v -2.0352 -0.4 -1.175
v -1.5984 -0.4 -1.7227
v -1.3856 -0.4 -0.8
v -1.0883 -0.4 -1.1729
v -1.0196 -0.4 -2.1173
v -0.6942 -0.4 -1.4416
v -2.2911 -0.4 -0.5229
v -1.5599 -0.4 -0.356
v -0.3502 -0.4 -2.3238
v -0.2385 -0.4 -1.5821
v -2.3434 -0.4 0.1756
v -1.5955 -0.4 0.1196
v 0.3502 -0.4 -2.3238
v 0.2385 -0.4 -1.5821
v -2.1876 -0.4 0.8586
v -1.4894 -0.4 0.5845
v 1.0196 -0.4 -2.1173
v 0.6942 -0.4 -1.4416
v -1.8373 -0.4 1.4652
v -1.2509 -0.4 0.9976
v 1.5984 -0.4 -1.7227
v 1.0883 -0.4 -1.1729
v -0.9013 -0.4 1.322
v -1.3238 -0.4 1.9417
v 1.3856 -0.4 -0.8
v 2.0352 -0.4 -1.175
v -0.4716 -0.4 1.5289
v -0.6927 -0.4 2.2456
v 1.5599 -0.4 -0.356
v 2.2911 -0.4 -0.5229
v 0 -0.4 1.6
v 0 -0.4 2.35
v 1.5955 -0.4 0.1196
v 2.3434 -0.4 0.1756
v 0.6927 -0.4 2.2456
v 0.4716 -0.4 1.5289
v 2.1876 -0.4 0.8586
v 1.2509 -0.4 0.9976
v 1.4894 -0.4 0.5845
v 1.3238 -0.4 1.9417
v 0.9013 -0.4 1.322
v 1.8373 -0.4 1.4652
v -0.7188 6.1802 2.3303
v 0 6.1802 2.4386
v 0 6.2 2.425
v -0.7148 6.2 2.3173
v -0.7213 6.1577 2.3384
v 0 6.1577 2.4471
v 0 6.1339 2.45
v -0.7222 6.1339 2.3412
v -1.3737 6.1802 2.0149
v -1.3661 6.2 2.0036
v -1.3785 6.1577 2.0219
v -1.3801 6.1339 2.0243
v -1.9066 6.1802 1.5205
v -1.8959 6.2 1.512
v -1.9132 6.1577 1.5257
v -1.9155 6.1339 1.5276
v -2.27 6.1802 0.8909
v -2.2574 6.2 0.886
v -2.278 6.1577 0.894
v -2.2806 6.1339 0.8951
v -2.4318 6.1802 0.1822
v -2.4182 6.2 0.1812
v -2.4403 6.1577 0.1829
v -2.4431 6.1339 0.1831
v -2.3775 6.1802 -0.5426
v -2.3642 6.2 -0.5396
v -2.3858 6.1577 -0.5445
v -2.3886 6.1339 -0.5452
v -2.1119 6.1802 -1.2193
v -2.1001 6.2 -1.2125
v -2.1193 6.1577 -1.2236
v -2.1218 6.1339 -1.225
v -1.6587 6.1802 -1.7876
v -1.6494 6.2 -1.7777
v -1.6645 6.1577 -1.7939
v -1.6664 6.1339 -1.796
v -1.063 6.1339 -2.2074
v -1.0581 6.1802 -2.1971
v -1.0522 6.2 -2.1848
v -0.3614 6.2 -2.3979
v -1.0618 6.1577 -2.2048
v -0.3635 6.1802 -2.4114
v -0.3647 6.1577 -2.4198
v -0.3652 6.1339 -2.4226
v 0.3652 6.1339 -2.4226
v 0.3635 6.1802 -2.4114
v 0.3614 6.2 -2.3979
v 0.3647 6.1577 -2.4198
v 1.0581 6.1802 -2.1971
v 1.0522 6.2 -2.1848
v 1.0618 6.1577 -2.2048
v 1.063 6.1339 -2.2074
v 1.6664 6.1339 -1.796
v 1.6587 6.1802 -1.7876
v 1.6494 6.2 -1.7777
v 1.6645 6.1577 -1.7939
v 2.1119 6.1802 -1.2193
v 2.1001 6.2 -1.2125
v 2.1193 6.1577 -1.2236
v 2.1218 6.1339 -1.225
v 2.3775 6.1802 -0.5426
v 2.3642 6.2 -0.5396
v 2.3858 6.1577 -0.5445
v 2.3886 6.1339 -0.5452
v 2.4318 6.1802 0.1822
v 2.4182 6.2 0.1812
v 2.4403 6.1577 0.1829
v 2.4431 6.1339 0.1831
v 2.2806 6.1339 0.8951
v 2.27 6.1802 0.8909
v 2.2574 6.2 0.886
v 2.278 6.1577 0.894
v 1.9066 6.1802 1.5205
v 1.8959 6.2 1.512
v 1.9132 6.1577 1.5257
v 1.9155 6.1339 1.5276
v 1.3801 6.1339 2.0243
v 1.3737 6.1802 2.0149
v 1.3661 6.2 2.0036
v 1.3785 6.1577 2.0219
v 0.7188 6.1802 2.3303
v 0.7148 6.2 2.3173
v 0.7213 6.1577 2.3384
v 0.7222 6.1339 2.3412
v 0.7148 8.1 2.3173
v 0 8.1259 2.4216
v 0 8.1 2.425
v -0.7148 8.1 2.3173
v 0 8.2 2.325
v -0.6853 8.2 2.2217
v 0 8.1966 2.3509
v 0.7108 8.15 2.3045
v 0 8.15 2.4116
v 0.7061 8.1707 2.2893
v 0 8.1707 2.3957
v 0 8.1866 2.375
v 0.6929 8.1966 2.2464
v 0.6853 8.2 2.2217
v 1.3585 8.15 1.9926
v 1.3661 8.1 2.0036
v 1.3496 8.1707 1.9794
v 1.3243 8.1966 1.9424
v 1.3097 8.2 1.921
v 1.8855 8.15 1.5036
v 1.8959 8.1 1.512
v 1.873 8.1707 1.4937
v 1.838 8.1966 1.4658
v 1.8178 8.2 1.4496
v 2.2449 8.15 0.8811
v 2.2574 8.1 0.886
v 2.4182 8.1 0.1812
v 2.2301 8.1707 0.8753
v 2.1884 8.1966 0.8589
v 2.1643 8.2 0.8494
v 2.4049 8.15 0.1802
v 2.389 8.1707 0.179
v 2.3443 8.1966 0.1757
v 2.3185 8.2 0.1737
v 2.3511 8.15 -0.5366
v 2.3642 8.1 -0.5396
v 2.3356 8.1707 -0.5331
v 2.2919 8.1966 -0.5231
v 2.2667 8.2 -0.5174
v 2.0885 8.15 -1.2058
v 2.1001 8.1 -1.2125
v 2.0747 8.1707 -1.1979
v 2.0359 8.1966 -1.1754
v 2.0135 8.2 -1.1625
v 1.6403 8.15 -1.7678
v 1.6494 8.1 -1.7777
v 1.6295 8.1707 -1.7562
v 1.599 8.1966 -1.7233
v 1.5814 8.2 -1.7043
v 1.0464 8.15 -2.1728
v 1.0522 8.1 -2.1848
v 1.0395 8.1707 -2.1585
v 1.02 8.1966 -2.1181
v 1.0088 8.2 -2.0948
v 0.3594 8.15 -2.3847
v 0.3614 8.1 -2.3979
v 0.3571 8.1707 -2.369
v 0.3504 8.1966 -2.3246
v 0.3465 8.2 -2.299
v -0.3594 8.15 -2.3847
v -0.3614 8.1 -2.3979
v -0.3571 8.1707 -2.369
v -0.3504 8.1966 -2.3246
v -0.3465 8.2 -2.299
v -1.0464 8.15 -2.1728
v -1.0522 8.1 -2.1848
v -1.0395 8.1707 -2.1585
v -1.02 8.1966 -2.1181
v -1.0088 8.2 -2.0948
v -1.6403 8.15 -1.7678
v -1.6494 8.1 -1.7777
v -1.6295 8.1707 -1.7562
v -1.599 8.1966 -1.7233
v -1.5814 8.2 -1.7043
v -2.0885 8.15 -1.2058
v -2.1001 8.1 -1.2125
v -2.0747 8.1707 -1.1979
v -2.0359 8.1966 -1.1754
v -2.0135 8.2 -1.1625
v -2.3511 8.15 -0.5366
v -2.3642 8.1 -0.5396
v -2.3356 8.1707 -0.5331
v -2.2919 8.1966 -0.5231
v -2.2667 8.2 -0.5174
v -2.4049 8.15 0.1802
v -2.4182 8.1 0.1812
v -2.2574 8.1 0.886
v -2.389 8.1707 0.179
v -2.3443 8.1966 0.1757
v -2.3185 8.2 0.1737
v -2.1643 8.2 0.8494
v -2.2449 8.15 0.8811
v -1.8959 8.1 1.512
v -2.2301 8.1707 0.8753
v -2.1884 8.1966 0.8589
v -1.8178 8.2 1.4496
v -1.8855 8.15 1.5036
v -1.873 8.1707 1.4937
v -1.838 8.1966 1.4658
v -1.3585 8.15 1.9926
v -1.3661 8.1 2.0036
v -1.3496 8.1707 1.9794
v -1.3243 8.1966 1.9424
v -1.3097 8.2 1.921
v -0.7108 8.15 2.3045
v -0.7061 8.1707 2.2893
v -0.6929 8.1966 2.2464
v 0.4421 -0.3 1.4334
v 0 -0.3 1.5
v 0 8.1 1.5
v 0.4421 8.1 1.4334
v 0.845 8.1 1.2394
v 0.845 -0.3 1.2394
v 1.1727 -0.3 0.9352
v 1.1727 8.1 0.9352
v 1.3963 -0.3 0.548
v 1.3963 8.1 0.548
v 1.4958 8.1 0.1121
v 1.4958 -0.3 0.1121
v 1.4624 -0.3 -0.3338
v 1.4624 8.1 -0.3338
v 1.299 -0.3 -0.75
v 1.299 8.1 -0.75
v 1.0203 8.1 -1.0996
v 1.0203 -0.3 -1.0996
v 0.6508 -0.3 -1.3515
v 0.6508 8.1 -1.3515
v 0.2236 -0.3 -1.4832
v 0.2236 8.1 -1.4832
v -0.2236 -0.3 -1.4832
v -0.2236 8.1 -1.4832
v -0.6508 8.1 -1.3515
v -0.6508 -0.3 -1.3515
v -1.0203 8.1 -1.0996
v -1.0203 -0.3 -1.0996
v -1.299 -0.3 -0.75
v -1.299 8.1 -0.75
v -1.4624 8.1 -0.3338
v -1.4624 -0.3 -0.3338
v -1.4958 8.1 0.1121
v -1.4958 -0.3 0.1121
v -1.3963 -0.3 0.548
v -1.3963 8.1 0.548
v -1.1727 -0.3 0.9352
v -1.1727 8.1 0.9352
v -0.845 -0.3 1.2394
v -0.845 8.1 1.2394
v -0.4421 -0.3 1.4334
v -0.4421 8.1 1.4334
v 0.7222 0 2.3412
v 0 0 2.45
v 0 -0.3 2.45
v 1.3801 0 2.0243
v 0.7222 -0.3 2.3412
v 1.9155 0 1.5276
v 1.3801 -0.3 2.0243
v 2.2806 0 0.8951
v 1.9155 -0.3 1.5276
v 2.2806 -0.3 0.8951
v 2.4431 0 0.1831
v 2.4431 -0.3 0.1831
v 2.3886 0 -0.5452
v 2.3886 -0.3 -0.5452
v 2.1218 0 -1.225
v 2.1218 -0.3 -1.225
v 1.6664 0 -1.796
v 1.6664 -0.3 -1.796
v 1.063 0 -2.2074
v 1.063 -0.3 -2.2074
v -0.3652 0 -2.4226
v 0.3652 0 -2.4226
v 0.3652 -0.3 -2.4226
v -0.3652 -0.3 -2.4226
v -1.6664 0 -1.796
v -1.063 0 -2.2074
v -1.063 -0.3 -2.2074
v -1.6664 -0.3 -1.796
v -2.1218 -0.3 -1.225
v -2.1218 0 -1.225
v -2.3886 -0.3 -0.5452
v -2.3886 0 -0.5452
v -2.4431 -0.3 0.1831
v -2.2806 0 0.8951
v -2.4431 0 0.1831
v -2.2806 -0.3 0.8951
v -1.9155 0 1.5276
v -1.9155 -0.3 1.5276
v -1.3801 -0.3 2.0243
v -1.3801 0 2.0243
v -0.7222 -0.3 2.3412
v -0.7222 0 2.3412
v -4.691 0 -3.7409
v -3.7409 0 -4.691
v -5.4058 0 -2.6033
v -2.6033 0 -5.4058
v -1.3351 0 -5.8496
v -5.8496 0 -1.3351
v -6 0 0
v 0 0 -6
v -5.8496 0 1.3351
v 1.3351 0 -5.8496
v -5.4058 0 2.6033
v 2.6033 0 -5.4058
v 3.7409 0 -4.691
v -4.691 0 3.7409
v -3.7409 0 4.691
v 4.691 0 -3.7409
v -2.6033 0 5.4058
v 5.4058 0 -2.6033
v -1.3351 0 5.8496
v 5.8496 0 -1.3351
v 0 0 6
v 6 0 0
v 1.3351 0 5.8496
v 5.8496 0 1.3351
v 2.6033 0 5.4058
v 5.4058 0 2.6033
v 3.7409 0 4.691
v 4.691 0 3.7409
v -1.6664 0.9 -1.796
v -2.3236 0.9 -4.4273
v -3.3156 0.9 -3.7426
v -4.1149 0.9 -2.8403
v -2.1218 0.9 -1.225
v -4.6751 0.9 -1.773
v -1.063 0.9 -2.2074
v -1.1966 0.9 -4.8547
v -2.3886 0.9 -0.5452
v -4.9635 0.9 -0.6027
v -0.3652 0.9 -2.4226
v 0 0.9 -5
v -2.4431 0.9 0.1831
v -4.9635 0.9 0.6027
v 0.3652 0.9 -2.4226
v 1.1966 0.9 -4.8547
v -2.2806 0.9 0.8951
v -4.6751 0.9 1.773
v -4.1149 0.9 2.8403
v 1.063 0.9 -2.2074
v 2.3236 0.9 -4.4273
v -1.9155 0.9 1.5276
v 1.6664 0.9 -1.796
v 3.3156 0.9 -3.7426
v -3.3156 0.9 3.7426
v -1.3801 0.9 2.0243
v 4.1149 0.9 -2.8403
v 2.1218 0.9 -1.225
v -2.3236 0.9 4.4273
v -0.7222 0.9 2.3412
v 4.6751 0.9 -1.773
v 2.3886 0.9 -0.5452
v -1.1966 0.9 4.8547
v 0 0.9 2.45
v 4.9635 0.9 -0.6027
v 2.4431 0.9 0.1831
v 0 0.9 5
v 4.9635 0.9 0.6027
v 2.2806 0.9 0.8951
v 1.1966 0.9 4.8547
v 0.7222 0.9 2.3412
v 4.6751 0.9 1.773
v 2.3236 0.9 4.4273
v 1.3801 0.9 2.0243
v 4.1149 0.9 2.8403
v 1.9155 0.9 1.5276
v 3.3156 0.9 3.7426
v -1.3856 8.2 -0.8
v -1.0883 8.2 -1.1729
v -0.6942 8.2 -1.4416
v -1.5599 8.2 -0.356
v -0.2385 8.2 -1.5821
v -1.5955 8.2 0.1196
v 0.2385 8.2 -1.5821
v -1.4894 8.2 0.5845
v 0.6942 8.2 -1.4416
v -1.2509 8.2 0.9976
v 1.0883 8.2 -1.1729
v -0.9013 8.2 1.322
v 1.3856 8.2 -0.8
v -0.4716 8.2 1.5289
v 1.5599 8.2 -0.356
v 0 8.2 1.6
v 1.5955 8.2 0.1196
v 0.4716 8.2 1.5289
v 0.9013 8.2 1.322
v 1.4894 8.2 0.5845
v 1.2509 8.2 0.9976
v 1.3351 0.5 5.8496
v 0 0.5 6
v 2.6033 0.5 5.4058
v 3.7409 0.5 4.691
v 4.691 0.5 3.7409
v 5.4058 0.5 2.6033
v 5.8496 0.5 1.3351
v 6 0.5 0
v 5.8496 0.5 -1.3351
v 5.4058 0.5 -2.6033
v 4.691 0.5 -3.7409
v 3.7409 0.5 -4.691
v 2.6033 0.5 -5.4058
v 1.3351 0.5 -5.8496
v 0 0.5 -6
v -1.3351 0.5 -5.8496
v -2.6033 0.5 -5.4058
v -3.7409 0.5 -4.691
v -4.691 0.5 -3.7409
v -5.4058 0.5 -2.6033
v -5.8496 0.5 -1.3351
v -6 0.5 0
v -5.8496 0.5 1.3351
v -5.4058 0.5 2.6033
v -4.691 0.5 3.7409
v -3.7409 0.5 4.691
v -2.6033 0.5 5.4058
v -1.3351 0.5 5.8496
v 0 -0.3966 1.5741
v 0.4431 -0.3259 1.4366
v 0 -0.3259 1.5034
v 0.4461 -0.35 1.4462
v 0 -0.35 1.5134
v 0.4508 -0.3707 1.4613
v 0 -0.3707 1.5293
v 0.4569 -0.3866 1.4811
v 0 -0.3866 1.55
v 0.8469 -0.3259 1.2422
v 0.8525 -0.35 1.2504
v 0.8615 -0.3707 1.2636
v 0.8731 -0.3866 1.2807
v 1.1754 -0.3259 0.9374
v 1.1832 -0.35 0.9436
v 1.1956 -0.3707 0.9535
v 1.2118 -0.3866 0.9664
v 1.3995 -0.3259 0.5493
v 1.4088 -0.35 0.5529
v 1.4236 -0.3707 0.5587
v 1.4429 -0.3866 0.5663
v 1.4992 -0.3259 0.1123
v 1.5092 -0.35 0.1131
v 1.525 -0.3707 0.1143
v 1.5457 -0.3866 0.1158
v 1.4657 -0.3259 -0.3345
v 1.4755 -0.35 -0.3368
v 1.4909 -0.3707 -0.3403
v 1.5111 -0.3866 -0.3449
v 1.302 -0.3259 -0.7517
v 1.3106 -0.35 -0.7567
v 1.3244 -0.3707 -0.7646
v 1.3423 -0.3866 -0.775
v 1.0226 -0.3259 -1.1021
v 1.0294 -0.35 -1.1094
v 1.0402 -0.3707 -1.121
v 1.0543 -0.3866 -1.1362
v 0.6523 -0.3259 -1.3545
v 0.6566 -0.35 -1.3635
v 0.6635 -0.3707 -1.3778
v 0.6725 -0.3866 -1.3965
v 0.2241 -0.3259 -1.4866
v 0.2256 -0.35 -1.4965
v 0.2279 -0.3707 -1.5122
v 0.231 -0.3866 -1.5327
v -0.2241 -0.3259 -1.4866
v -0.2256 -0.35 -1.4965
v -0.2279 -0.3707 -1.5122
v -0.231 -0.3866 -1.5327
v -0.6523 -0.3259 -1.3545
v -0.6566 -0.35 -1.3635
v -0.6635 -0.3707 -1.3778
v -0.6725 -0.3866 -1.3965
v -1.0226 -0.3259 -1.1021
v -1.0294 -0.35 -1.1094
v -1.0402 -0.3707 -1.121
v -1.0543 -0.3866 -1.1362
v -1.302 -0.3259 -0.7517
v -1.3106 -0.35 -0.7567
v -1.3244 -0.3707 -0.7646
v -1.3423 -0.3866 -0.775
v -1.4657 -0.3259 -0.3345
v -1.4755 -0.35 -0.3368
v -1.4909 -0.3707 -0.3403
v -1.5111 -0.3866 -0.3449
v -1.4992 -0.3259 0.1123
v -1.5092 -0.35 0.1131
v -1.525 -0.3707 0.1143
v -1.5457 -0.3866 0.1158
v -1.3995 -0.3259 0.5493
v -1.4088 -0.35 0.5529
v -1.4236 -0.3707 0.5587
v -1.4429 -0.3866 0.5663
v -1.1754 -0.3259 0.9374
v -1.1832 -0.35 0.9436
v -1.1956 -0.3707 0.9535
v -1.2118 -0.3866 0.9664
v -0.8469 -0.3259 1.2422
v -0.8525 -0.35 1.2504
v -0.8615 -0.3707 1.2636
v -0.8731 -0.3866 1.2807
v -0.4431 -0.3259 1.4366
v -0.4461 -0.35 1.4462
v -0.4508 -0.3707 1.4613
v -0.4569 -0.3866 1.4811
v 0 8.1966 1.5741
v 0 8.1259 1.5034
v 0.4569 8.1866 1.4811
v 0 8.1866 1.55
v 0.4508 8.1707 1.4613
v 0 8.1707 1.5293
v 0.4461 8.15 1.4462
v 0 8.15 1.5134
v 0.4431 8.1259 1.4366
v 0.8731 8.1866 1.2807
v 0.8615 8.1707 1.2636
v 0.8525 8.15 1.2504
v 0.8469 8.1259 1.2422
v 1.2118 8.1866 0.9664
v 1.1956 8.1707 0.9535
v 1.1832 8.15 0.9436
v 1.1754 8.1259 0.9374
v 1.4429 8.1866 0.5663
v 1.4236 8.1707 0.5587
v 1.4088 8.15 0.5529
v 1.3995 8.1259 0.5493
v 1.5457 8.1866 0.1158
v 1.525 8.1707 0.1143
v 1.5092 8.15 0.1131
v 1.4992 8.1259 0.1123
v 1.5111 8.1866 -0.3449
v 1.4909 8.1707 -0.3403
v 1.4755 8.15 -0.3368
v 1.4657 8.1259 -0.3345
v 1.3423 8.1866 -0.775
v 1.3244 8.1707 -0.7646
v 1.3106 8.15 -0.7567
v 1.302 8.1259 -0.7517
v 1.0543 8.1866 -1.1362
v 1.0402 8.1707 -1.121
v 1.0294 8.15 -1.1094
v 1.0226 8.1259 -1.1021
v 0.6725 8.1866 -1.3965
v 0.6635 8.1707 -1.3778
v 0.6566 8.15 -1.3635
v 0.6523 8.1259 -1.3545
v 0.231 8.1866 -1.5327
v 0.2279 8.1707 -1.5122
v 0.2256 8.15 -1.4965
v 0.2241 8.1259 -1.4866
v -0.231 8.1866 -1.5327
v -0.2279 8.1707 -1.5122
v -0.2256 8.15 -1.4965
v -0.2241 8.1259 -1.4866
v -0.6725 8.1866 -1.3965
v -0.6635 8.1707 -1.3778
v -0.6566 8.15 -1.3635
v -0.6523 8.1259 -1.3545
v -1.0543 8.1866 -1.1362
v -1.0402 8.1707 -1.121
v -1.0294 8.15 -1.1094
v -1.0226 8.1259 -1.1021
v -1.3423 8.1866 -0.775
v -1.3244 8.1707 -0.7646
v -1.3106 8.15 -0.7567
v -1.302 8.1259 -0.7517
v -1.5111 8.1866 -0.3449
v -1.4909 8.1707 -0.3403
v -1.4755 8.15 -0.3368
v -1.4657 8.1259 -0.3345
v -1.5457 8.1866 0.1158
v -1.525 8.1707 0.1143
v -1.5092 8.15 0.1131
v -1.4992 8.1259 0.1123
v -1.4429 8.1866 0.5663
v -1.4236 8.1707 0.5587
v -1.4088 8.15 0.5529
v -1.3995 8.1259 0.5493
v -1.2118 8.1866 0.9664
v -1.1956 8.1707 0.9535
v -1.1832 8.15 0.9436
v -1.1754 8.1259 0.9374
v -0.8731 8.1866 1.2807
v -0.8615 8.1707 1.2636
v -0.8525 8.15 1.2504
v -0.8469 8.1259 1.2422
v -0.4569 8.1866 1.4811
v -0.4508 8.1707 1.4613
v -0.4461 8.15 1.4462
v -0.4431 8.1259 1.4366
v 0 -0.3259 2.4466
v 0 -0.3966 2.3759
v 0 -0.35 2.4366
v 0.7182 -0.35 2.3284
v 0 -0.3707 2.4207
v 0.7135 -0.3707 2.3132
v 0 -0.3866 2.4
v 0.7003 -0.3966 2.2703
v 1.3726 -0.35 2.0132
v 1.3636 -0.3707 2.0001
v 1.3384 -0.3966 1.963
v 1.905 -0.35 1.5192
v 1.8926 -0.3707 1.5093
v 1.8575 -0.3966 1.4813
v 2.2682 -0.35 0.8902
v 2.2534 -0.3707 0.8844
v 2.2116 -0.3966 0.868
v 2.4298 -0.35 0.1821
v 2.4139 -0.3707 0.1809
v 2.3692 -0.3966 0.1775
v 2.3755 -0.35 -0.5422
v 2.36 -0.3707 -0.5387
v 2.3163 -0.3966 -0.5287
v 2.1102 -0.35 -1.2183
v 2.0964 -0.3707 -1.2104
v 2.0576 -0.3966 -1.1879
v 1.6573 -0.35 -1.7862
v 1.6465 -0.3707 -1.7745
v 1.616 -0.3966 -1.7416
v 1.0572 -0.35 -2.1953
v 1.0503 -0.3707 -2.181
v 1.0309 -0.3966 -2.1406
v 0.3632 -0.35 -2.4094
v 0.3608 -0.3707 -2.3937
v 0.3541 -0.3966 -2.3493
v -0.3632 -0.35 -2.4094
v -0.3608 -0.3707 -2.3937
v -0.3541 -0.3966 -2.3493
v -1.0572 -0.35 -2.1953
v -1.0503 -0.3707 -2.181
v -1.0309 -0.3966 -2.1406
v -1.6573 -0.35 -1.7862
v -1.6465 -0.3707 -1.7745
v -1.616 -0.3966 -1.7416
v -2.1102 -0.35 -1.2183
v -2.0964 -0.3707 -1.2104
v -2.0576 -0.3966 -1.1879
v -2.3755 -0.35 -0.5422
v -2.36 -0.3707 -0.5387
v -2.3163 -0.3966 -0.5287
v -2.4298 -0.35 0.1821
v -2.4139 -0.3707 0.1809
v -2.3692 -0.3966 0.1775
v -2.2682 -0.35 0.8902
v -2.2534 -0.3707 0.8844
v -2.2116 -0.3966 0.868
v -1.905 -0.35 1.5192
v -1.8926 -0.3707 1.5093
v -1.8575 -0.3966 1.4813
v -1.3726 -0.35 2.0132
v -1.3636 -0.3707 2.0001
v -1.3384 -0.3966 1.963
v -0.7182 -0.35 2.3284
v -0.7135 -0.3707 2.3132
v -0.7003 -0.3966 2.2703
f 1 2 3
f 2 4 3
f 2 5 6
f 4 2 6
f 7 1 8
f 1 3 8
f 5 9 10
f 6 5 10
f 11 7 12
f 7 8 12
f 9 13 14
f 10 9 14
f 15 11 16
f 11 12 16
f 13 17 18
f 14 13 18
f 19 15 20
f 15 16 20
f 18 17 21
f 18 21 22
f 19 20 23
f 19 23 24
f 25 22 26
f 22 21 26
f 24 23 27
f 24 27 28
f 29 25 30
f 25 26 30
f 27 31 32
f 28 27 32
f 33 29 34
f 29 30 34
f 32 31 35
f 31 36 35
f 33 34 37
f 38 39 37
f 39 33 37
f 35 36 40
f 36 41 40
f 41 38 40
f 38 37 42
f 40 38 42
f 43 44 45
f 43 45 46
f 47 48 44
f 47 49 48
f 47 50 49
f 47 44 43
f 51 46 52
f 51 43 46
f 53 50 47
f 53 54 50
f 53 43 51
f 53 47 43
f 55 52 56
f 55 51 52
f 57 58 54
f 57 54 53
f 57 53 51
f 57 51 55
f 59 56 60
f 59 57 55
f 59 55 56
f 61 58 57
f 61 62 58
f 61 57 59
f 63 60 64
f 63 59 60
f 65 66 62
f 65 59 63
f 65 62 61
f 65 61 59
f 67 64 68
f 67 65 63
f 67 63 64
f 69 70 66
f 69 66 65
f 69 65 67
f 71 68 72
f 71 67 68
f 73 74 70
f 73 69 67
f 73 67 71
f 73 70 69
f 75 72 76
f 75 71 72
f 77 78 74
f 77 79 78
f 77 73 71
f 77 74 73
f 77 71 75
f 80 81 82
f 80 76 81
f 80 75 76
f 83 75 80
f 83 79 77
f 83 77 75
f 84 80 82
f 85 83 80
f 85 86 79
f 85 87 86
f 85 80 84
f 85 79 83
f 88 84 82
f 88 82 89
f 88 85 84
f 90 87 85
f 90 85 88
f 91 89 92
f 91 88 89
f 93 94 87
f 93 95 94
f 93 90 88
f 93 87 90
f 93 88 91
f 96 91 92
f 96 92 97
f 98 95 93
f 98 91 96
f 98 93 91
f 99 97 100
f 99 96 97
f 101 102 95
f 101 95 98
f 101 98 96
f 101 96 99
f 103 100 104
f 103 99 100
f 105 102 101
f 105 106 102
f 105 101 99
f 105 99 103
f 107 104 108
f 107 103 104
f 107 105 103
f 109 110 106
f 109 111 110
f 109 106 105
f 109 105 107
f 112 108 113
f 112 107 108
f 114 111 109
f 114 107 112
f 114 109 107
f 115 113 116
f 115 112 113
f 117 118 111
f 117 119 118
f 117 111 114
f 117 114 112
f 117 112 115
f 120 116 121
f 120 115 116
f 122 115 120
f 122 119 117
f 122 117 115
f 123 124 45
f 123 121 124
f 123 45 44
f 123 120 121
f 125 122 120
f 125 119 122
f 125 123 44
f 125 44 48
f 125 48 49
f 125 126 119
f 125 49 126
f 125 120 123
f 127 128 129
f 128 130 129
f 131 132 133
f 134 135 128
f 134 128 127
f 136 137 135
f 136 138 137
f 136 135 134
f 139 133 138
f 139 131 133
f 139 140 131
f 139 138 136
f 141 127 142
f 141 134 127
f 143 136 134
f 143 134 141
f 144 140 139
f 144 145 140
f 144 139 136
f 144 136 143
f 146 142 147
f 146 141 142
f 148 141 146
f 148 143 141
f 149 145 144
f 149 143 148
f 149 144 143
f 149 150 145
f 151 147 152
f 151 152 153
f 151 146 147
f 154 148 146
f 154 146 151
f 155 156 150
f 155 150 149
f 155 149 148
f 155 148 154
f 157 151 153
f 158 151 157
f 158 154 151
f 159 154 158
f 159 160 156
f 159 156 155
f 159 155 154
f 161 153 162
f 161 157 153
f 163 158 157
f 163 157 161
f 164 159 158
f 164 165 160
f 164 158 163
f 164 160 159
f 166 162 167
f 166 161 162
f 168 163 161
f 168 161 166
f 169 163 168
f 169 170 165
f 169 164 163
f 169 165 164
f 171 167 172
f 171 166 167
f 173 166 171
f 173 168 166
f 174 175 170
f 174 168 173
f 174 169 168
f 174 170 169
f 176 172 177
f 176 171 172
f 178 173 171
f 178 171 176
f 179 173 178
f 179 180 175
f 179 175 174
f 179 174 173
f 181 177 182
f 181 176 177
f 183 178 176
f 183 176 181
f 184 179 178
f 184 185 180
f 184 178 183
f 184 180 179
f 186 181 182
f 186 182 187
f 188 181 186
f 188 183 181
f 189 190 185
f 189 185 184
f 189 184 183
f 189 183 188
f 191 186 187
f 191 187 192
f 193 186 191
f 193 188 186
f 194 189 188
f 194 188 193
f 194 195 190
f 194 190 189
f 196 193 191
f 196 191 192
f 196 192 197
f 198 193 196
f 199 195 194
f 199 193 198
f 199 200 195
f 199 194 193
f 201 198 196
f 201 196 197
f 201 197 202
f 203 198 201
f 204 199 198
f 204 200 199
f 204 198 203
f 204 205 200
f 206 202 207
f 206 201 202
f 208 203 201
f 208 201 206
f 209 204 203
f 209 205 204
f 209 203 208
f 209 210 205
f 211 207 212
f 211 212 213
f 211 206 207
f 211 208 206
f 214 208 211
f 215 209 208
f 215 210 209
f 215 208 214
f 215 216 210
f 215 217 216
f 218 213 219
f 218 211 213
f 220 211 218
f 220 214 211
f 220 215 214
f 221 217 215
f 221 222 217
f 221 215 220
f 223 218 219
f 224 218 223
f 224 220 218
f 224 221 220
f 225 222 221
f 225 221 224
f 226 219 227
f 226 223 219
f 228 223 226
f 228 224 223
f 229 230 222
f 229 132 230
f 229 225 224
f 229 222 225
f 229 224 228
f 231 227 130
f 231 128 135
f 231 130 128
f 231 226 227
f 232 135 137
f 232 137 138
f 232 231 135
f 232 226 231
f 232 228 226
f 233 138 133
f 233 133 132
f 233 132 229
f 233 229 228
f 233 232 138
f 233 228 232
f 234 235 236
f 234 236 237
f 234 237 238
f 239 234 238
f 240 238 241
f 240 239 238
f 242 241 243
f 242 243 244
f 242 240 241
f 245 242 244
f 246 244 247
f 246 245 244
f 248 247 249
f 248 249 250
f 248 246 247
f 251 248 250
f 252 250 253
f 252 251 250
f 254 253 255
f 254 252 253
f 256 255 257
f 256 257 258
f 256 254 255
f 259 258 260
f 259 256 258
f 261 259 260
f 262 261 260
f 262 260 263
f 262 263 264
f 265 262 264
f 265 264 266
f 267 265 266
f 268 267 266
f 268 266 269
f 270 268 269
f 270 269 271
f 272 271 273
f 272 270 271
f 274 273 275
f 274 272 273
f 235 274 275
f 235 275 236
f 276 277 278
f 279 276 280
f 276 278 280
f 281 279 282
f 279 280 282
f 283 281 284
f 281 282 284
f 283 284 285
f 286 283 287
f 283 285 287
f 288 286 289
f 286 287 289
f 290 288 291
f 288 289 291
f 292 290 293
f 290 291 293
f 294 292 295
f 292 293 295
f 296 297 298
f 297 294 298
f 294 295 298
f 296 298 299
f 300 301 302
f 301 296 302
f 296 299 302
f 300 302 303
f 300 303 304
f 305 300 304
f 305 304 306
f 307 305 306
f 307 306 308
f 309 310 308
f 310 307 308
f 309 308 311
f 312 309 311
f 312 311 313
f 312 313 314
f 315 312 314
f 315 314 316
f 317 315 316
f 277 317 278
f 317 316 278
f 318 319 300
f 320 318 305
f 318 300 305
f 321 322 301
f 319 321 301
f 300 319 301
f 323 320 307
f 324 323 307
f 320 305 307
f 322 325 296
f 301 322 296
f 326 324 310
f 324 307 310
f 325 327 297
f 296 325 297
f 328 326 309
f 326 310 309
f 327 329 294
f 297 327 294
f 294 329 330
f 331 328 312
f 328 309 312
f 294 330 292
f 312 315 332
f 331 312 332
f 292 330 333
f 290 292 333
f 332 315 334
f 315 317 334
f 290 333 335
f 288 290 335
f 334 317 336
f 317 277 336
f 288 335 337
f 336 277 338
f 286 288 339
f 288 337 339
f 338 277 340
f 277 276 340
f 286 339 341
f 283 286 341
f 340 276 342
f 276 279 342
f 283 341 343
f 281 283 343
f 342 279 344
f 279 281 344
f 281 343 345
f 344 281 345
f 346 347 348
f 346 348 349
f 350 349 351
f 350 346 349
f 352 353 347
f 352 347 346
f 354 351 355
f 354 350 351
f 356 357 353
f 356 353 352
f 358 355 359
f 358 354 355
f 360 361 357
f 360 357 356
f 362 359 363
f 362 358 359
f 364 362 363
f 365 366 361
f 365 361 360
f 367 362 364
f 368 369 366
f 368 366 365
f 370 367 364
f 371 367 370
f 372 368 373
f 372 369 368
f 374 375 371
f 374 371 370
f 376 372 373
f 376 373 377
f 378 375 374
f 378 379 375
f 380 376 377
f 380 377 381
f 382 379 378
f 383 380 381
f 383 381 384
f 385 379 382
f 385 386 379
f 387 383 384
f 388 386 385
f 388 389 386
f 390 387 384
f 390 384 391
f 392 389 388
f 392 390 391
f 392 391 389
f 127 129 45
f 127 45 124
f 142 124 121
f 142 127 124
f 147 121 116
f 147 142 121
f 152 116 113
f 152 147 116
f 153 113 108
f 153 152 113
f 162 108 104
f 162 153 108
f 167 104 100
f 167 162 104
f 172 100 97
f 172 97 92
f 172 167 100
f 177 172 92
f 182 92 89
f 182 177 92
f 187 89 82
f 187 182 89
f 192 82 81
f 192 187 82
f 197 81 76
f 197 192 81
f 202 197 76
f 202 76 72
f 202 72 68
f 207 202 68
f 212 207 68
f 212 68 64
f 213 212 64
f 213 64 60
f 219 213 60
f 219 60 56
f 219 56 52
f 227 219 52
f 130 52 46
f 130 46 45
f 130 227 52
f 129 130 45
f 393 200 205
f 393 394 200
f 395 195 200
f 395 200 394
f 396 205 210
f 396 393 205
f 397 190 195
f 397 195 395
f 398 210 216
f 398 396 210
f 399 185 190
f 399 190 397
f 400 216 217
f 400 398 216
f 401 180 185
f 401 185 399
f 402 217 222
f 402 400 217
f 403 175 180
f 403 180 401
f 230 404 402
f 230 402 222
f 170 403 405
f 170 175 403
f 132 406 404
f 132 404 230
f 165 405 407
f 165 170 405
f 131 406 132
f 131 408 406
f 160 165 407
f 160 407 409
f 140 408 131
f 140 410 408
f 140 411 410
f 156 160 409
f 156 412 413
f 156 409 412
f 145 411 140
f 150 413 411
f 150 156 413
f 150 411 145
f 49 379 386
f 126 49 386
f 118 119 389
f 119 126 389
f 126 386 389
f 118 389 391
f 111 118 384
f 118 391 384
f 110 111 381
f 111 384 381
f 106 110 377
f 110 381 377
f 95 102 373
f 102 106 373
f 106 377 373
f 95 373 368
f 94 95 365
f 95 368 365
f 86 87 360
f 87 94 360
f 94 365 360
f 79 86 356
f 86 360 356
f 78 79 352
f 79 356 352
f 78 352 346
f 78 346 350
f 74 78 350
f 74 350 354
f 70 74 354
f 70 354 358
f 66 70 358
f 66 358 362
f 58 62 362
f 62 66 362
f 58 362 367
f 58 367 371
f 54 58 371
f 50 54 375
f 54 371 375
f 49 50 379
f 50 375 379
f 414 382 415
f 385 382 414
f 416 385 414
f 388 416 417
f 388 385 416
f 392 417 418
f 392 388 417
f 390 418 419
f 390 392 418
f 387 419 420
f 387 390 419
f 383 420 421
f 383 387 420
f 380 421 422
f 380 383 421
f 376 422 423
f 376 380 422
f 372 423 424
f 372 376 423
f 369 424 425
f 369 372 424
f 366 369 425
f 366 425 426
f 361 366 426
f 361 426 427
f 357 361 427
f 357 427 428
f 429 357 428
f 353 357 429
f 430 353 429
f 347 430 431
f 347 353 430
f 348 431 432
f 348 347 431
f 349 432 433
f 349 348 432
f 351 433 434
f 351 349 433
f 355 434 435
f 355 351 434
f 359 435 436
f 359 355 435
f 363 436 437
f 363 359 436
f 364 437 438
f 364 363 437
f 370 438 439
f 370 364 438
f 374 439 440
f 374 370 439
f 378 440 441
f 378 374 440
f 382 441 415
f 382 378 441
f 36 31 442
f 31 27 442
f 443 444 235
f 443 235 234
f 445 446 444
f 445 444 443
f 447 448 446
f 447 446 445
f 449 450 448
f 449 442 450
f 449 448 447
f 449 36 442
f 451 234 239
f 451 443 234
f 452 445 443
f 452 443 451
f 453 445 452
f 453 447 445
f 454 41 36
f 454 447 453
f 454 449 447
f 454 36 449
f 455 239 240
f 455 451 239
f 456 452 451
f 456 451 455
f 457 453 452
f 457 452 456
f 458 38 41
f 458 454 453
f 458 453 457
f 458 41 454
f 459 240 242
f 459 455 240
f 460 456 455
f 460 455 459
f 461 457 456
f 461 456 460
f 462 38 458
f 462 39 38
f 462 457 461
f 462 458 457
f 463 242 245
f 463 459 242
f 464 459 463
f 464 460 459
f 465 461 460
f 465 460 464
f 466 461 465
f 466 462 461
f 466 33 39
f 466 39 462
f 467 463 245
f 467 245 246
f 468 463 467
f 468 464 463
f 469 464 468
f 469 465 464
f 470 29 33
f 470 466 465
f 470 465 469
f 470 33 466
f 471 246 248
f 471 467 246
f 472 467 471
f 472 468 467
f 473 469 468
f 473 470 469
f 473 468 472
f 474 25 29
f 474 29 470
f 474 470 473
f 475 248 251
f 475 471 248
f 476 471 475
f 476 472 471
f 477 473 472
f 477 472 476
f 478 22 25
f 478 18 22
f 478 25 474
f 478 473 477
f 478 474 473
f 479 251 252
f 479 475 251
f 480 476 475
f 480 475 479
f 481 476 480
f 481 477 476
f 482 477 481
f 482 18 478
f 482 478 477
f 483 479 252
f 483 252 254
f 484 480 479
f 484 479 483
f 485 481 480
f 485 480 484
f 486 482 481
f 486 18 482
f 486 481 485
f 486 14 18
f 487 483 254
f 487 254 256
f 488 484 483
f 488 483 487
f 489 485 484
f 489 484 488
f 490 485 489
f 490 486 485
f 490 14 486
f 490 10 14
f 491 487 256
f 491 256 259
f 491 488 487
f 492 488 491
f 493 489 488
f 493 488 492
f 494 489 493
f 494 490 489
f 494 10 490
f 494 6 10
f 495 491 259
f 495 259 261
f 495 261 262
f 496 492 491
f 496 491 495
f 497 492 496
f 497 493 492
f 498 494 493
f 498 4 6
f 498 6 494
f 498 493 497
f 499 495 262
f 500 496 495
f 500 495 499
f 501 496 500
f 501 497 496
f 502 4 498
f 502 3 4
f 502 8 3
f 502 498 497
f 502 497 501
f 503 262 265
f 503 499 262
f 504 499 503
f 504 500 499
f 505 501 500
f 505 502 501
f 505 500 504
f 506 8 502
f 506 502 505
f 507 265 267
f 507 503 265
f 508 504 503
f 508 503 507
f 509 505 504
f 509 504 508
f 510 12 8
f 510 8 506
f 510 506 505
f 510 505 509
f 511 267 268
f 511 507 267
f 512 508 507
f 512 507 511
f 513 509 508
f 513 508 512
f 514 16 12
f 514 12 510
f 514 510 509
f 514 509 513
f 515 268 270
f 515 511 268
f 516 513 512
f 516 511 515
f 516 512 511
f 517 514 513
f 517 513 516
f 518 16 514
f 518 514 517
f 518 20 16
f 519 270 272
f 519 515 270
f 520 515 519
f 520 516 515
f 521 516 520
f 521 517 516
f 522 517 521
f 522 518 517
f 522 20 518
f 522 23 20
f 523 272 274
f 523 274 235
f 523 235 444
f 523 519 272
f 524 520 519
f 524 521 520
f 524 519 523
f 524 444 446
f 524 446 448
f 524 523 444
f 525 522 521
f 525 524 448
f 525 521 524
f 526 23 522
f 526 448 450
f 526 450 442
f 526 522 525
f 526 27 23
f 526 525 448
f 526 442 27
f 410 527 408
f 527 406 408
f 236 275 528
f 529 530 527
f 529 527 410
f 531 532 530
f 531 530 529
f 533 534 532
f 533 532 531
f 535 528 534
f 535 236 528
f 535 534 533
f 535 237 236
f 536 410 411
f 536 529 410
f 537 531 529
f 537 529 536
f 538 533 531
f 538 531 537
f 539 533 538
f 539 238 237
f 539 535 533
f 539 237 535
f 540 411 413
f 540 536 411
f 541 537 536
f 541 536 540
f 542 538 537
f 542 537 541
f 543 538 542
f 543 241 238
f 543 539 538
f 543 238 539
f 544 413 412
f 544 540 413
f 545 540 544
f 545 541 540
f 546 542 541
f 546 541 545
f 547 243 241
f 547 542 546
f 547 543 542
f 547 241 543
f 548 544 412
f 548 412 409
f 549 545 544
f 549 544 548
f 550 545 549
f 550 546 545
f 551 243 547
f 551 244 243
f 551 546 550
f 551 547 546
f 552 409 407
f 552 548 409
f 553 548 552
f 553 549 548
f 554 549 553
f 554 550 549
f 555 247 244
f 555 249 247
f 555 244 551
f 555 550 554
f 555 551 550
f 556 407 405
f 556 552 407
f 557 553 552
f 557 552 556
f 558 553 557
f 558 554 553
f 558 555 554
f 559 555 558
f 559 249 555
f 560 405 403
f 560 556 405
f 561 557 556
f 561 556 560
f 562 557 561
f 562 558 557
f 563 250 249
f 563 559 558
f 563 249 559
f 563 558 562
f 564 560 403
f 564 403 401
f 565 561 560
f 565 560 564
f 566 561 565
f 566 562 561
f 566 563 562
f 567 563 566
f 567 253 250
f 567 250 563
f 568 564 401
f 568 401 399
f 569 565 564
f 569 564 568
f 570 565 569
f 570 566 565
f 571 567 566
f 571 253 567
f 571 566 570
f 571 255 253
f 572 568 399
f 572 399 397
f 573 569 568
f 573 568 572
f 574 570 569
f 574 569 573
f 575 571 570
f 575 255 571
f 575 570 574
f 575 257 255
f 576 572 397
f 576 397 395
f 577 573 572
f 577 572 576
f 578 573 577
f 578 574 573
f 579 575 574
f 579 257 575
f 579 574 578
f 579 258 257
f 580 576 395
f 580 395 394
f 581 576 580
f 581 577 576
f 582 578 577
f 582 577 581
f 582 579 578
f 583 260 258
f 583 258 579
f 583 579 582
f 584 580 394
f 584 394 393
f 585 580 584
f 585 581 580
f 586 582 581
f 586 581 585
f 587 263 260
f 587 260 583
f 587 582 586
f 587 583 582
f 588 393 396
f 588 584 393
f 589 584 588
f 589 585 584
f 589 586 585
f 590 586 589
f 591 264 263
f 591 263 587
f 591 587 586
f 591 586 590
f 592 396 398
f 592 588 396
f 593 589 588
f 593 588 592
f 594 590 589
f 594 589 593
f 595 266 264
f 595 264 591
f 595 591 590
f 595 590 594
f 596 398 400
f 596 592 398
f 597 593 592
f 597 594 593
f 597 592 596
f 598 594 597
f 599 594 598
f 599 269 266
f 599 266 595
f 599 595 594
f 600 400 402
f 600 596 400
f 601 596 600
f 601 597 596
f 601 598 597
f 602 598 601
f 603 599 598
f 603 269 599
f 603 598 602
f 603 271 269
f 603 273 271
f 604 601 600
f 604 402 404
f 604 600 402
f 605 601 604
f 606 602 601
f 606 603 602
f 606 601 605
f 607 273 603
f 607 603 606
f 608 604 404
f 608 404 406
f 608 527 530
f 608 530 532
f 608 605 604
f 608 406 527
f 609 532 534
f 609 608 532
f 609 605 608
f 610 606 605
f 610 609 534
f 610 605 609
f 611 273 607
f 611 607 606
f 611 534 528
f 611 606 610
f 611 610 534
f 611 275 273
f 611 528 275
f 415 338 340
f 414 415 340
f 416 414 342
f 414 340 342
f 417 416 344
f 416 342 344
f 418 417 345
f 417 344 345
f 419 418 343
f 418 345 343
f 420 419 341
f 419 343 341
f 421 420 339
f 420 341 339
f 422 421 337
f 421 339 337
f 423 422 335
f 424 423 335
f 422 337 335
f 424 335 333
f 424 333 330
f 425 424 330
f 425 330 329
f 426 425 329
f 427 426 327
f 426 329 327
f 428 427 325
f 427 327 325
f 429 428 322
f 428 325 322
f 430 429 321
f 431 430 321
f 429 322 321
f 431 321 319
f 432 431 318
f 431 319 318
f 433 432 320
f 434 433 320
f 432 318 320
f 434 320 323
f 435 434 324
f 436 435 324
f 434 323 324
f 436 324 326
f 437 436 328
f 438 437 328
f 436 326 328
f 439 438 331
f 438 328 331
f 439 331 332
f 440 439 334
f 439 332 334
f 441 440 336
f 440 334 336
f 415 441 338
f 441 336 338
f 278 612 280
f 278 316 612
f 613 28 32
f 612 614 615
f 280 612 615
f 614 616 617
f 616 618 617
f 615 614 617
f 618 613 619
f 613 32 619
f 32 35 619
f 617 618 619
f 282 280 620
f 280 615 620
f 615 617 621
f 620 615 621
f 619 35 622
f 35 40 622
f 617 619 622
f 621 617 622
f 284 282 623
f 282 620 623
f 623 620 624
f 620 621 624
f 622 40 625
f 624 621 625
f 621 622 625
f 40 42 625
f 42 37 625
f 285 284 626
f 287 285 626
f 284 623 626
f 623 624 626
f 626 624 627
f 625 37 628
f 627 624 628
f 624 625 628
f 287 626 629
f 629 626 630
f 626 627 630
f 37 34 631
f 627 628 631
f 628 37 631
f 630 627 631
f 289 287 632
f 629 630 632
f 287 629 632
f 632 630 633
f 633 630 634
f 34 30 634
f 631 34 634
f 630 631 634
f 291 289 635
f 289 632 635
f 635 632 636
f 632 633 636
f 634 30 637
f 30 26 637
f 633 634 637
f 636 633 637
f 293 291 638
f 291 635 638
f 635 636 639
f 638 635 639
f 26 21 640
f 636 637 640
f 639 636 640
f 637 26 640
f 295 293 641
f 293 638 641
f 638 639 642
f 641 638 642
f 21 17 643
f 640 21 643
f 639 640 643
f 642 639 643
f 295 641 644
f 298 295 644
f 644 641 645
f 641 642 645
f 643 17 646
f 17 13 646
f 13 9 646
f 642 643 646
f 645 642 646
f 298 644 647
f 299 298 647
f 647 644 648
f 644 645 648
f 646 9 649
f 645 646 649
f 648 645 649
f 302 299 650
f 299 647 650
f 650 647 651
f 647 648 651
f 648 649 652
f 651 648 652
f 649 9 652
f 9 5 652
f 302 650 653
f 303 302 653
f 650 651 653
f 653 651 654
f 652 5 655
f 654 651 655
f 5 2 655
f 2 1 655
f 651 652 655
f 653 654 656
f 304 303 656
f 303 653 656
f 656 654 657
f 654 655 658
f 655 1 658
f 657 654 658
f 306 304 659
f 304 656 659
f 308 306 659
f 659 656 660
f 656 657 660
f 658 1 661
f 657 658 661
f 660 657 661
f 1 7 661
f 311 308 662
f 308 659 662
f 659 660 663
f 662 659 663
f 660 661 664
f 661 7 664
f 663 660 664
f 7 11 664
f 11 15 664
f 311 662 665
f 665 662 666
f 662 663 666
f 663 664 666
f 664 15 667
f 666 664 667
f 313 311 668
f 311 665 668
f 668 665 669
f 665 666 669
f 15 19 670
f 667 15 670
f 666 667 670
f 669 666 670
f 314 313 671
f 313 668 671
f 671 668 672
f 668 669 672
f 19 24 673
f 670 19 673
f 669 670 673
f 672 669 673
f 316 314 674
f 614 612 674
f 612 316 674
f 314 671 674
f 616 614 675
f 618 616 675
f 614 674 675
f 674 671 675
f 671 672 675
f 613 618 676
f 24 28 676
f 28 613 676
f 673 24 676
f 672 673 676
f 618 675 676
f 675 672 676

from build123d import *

# Parameters (mm, degrees)
SKETCH_1_R           = 6
SKETCH_1_R_2         = 1.5
EXTRUDE_1_DEPTH      = 0.9
EXTRUDE_2_DEPTH      = 7.3
EXTRUDE_2_DEPTH_BACK = 1.3
SKETCH_2_R           = 2.45
SKETCH_2_R_2         = 1.5
SKETCH_3_OUTSIDE_W   = 17.806
SKETCH_3_OUTSIDE_H   = 17.806
SKETCH_3_OUTSIDE_R   = 2.425
SKETCH_3_OUTSIDE_R_2 = 1.5
CUT_EXTRUDE_1_DEPTH  = 2
FILLET_1_R           = 0.1
FILLET_2_R           = 0.1
CHAMFER_1_SIZE       = 0.4
CHAMFER_1_SIZE2      = 1


with BuildPart() as part:
    # 草图1 → 凸台-拉伸1 (new body)
    with BuildSketch(Plane(origin=(0, 0, 0), x_dir=(1, 0, 0), z_dir=(0, 1, 0))):
        with Locations(Location((0, 0, 0), (0, 0, 270))):
            Circle(SKETCH_1_R)
        with Locations(Location((0, 0, 0), (0, 0, 270))):
            Circle(SKETCH_1_R_2, mode=Mode.SUBTRACT)
    extrude(amount=EXTRUDE_1_DEPTH)

    # 草图2 → 凸台-拉伸2 (add, two sides: drawn at the far end of the back side and taken through both)
    with BuildSketch(Plane(origin=(0, 0.9, 0), x_dir=(1, 0, 0), z_dir=(0, 1, 0)).offset(-EXTRUDE_2_DEPTH_BACK)):
        with Locations(Location((0, 0, 0), (0, 0, 270))):
            Circle(SKETCH_2_R)
        with Locations(Location((0, 0, 0), (0, 0, 270))):
            Circle(SKETCH_2_R_2, mode=Mode.SUBTRACT)
    extrude(amount=EXTRUDE_2_DEPTH + EXTRUDE_2_DEPTH_BACK)

    # 草图3 outside → 切除-拉伸1 (cut)
    # profile 1 of 2: a face of its own
    with BuildSketch(Plane(origin=(0, 8.2, 0), x_dir=(1, 0, 0), z_dir=(0, 1, 0))):
        Rectangle(SKETCH_3_OUTSIDE_W, SKETCH_3_OUTSIDE_H)
        with Locations(Location((0, 0, 0), (0, 0, 270))):
            Circle(SKETCH_3_OUTSIDE_R, mode=Mode.SUBTRACT)
    # profile 2 of 2: a face of its own
    with BuildSketch(Plane(origin=(0, 8.2, 0), x_dir=(1, 0, 0), z_dir=(0, 1, 0))):
        with Locations(Location((0, 0, 0), (0, 0, 270))):
            Circle(SKETCH_3_OUTSIDE_R_2)
    extrude(amount=-CUT_EXTRUDE_1_DEPTH, mode=Mode.SUBTRACT)

    # 圆角1
    fillet_1_edges = [part.edges().sort_by_distance(p)[0] for p in [
        (0, -0.4, -2.45),
        (0, -0.4, -1.5),
        (0, 8.2, -1.5),
        (0, 8.2, -2.425),
    ]]
    fillet(fillet_1_edges, radius=FILLET_1_R)

    # 圆角2
    # the kernel refuses this fillet: 0.1 mm, written as the material it takes off along each edge
    with BuildSketch(Plane(origin=(0, 6.2, 0), x_dir=(0, 0, 1), z_dir=(1, 0, 0))) as fillet_2_piece_1:
        with BuildLine():
            CenterArc((2.35, 0.066143783), FILLET_2_R, 318.590377891, 41.409622109)
            Line((2.425, 0), (2.4265, -0.001322876))
            ThreePointArc((2.4265, -0.001322876), (2.4375, -0.002), (2.45, -0.002))
            Line((2.45, -0.002), (2.452, 0))
            Line((2.452, 0), (2.452, 0.066143783))
            Line((2.452, 0.066143783), (2.45, 0.066143783))
        make_face()
    revolve(axis=Axis((0, 6.2, 0), (0, -1, 0)), mode=Mode.SUBTRACT)

    # 倒角1
    chamfer_1_edges = [part.edges().sort_by_distance(p)[0] for p in [
        (0, 0.9, -6),
    ]]
    chamfer_1_side = [part.faces().sort_by_distance(p)[0] for p in [
        (0, 0.45, -6),
    ]]
    chamfer(chamfer_1_edges, length=CHAMFER_1_SIZE, length2=CHAMFER_1_SIZE2, reference=chamfer_1_side[0])


solid = part.part
